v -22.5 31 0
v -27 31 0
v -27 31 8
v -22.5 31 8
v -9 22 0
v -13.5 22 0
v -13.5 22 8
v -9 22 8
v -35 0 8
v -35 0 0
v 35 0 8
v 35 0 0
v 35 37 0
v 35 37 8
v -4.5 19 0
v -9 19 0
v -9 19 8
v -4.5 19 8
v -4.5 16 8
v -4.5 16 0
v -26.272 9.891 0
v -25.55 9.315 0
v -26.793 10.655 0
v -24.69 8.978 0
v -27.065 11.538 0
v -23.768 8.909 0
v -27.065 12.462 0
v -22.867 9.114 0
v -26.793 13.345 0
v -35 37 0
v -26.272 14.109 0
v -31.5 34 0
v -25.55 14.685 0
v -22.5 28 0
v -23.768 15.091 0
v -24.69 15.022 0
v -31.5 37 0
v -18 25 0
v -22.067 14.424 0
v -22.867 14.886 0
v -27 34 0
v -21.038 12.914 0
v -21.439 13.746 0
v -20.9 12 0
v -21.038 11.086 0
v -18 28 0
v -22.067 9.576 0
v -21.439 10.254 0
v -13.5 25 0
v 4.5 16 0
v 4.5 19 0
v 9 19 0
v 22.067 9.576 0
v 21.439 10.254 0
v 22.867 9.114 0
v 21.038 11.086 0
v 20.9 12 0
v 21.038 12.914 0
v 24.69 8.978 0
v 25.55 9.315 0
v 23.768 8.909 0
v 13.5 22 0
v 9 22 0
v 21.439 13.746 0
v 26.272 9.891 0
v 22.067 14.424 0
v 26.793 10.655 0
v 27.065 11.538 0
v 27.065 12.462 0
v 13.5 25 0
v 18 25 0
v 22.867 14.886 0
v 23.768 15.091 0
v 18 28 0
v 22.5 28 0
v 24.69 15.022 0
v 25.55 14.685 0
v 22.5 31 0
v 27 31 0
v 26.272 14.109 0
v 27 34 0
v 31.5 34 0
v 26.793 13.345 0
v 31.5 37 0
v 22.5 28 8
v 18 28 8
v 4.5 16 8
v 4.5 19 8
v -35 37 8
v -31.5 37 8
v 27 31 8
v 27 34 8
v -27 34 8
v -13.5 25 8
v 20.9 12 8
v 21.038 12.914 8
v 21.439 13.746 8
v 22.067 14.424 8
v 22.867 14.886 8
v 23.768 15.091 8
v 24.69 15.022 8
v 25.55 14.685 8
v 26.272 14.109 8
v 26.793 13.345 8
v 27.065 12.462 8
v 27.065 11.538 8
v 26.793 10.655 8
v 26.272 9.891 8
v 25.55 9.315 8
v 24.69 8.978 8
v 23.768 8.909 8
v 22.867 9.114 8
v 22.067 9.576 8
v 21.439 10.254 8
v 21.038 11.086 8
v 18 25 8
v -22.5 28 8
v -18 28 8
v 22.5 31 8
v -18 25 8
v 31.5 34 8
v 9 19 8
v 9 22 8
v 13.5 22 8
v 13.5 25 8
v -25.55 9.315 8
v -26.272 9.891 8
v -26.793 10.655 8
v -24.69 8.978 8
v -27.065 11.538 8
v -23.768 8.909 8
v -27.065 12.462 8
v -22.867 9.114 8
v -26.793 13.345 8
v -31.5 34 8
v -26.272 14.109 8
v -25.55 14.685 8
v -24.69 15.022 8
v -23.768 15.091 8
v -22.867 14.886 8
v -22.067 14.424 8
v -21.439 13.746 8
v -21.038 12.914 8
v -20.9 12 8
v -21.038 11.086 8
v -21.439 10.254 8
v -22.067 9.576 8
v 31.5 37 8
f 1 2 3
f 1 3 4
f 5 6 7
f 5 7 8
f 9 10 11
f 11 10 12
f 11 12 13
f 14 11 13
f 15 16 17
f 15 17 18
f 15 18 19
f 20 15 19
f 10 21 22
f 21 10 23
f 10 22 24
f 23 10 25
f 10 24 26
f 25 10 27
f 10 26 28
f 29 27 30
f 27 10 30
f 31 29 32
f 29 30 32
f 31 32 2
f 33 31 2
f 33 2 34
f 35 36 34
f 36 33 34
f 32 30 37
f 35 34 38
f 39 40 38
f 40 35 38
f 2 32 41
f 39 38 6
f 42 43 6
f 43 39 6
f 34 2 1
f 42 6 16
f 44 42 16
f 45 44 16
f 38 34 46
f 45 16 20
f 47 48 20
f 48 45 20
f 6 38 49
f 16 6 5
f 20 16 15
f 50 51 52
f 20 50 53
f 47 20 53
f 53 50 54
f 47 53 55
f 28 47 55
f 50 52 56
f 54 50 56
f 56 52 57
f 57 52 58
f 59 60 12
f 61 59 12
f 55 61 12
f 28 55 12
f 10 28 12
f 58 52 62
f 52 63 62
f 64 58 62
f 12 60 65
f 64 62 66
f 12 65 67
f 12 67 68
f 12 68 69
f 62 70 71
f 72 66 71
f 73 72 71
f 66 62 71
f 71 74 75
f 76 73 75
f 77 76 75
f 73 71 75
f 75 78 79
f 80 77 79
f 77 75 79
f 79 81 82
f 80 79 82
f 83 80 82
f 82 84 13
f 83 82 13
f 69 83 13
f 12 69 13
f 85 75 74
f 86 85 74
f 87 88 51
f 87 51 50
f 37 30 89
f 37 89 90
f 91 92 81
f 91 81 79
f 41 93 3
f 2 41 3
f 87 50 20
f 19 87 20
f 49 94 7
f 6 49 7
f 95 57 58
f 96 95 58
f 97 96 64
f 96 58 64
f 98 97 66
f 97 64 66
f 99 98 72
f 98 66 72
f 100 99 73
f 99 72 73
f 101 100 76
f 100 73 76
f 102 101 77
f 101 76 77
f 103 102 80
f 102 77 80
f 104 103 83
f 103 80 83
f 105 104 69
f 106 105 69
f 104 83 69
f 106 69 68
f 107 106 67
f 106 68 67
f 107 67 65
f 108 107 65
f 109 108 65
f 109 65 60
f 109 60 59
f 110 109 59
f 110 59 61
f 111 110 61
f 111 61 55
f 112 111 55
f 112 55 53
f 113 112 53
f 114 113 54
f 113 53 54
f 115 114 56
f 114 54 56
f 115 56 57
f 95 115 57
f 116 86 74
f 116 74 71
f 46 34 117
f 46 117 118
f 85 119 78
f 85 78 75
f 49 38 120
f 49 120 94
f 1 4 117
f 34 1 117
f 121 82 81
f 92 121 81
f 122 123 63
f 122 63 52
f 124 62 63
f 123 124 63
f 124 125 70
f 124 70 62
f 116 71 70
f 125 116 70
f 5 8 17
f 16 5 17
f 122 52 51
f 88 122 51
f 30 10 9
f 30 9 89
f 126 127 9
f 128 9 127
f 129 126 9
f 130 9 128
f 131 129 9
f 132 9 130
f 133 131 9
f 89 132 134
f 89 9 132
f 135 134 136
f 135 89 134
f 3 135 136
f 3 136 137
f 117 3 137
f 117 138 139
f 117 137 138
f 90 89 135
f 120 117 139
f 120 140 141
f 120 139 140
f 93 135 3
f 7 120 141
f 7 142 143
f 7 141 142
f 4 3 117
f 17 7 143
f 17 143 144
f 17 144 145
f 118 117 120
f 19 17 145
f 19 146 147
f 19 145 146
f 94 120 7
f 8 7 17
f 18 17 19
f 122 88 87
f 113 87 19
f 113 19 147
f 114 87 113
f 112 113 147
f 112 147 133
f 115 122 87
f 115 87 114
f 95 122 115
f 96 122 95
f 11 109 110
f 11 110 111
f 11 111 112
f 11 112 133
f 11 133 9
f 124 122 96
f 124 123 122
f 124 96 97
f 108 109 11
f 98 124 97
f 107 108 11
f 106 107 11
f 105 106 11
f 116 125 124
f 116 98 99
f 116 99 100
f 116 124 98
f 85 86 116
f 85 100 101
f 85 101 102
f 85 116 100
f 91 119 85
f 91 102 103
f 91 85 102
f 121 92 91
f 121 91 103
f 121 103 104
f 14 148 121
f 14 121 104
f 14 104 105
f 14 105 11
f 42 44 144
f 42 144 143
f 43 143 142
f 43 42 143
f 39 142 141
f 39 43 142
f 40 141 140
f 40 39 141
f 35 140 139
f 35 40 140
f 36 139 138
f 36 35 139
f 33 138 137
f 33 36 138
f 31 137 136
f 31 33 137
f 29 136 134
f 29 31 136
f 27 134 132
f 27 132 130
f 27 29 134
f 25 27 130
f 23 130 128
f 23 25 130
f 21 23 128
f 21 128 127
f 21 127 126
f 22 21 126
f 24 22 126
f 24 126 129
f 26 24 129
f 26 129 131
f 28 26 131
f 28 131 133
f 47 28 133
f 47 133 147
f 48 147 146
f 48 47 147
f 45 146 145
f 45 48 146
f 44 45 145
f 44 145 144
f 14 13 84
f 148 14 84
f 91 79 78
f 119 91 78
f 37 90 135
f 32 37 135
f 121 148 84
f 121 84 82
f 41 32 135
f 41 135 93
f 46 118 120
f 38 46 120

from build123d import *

# Parameters (mm, degrees)
SKETCH1_R           = 3.1
BOSS_EXTRUDE1_DEPTH = 8


with BuildPart() as part:
    # Sketch1 → Boss-Extrude1 (new body)
    with BuildSketch(Plane.XY):
        Polygon((-35, 0), (-35, 37), (-31.5, 37), (-31.5, 34), (-27, 34), (-27, 31), (-22.5, 31), (-22.5, 28), (-18, 28), (-18, 25), (-13.5, 25), (-13.5, 22), (-9, 22), (-9, 19), (-4.5, 19), (-4.5, 16), (0, 16), (0, 0), align=None)
        with Locations((-24, 12)):
            Circle(SKETCH1_R, mode=Mode.SUBTRACT)
    boss_extrude1 = extrude(amount=BOSS_EXTRUDE1_DEPTH)

    # Mirror1: Boss-Extrude1 across plane
    add(boss_extrude1.mirror(Plane(origin=(0, 0, 0), x_dir=(0, 0, 1), z_dir=(1, 0, 0))))


solid = part.part
